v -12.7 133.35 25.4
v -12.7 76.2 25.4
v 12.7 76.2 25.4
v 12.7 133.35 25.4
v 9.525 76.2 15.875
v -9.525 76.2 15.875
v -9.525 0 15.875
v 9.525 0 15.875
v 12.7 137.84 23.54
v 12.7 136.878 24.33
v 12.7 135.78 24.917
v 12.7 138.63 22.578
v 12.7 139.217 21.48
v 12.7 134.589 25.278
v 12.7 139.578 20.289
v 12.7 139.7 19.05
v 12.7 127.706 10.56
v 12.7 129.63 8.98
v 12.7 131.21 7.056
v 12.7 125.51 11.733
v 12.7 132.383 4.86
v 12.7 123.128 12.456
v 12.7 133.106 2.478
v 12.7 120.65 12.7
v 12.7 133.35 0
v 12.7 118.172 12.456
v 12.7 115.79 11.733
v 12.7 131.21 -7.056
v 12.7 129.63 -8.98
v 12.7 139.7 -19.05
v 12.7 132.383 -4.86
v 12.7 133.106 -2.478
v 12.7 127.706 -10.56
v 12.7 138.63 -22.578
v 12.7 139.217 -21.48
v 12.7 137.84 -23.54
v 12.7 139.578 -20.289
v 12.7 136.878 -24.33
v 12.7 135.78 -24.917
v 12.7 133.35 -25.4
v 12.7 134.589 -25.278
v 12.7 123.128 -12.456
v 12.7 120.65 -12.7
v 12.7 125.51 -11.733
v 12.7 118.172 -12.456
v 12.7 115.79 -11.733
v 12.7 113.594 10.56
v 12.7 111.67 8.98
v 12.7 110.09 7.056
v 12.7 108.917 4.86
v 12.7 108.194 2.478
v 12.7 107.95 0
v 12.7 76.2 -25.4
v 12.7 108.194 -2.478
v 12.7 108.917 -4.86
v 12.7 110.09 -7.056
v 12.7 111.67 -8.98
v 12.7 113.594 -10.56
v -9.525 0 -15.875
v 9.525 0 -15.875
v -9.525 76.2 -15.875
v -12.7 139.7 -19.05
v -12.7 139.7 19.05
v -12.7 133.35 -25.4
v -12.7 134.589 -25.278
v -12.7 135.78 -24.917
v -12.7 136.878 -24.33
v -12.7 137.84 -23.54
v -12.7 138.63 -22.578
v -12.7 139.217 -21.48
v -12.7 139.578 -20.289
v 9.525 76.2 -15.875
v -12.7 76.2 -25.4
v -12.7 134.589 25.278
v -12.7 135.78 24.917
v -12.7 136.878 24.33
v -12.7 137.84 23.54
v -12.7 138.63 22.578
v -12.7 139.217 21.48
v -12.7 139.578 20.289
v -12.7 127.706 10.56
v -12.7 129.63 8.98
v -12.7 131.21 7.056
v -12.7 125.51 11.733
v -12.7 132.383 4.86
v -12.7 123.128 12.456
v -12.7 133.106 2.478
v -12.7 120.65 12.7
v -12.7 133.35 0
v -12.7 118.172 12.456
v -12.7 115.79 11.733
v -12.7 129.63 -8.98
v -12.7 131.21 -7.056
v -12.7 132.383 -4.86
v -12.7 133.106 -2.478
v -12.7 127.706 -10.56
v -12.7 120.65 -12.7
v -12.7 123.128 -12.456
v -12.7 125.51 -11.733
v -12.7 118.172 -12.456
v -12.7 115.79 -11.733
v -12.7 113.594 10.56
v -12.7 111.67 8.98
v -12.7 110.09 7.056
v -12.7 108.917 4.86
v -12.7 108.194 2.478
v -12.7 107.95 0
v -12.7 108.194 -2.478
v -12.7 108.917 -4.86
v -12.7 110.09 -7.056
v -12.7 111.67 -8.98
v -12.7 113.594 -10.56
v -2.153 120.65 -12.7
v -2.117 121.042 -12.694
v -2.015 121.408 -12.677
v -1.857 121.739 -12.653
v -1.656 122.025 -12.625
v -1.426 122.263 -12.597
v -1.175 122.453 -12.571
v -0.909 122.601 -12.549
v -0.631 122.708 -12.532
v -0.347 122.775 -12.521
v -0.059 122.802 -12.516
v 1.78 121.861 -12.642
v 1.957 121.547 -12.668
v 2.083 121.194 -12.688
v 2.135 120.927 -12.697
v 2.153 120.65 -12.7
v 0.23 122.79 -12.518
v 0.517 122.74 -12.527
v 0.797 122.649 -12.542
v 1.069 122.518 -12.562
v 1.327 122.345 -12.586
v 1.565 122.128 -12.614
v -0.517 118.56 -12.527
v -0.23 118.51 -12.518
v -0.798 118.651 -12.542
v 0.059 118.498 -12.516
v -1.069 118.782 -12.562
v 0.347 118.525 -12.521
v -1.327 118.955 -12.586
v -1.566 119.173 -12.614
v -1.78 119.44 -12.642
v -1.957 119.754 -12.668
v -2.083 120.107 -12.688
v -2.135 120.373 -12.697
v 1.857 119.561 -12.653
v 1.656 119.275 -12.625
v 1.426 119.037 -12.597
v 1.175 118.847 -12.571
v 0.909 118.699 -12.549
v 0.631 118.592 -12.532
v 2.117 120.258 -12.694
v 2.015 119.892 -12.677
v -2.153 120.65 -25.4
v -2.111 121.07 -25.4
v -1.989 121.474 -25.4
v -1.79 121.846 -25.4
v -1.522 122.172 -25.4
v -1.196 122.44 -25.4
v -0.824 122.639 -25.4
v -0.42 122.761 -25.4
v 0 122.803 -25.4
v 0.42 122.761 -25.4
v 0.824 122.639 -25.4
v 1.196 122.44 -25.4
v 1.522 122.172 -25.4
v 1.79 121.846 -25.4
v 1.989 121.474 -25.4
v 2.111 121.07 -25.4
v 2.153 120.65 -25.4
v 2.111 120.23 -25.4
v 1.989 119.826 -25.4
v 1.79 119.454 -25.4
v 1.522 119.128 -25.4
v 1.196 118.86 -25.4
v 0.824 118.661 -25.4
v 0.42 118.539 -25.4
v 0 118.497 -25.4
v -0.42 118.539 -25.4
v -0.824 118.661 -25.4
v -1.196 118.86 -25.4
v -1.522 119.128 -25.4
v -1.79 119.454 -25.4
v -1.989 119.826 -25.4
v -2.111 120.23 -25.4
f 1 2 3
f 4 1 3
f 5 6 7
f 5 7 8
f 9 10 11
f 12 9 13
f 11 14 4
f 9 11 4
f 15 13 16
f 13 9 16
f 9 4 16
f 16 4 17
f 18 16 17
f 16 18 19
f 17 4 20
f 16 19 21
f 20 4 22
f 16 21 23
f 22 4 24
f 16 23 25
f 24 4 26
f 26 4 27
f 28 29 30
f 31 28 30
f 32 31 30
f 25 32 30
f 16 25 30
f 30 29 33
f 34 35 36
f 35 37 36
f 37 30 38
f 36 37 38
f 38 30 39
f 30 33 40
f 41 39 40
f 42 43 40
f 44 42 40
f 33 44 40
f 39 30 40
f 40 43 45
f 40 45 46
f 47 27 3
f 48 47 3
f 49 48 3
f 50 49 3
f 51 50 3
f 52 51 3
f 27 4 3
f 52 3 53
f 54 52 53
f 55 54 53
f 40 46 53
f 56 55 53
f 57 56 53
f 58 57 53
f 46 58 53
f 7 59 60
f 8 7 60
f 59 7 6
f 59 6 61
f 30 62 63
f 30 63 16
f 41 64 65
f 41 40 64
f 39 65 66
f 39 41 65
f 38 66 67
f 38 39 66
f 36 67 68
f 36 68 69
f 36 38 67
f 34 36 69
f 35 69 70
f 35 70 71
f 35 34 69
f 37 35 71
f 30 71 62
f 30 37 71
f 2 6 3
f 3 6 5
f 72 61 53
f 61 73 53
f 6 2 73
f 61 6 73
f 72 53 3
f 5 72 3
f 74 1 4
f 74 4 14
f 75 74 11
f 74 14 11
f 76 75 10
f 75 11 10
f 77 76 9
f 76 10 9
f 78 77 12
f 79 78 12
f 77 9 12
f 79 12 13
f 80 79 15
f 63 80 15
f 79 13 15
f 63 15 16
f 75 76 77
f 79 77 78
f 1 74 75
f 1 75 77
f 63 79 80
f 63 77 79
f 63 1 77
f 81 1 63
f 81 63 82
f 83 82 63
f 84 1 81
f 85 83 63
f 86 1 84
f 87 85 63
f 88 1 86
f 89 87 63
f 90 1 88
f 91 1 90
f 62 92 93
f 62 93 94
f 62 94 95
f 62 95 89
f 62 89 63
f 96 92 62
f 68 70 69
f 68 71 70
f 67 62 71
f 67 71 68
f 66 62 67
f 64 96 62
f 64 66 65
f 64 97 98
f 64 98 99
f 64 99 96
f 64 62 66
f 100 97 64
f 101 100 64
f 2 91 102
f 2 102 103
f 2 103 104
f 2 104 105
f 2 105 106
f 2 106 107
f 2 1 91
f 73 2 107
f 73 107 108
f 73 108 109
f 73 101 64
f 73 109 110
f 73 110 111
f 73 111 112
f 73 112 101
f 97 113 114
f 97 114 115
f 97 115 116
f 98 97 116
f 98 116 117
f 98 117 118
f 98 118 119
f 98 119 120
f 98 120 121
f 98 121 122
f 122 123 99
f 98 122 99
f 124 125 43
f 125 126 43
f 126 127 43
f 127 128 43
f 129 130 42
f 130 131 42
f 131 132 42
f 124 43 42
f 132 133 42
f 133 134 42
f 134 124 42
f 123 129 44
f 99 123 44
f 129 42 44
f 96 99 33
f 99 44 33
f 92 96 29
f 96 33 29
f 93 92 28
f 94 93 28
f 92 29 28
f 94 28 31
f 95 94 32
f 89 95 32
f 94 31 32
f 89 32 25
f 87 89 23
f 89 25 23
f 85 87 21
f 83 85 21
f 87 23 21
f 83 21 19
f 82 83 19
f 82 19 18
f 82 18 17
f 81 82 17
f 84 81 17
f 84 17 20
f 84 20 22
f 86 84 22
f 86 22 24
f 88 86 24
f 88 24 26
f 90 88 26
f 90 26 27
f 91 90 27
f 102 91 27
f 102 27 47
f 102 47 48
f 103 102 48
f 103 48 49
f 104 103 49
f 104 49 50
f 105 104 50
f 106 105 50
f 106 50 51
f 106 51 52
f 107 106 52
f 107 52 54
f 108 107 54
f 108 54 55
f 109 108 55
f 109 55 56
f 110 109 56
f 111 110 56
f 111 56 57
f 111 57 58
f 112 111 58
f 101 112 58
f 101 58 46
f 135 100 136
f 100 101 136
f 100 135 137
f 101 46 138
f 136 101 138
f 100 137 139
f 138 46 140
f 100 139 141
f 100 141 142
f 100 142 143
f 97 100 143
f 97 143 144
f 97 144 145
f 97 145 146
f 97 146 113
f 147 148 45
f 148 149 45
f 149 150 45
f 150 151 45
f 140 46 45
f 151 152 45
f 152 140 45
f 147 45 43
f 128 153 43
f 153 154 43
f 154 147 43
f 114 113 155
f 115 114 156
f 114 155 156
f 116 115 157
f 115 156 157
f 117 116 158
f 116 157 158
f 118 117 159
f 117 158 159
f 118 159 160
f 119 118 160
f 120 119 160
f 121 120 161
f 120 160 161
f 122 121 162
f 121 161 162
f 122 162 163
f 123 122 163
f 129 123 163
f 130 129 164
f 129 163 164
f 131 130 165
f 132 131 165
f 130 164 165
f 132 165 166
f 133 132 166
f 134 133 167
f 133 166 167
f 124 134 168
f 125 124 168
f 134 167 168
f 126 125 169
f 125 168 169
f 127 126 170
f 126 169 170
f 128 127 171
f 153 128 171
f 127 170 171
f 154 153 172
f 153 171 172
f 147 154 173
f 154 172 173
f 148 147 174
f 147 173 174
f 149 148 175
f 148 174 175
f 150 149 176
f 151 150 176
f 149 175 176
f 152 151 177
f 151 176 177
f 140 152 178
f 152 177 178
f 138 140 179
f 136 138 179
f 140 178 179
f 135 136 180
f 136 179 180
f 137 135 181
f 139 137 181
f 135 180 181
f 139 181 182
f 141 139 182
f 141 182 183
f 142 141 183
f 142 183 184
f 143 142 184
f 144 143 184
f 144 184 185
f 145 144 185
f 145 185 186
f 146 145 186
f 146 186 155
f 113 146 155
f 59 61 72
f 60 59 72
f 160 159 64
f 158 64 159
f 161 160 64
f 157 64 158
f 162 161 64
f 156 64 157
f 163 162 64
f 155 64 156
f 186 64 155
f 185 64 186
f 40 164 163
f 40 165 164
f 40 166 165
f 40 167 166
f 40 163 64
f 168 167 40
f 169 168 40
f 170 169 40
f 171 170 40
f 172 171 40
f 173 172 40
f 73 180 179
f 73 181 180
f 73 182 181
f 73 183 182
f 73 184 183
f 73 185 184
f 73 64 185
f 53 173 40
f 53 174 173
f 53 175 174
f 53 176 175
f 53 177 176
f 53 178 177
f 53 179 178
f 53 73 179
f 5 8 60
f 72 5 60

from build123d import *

# Parameters (mm, degrees)
SKETCH2_W               = 19.05
SKETCH2_H               = 31.75
BOSS_EXTRUDE1_DEPTH     = 76.2
SKETCH3_W               = 25.4
SKETCH3_H               = 50.8
BOSS_EXTRUDE2_DEPTH     = 63.5
FILLET1_R               = 6.35
SKETCH4_R               = 12.7
CUT_EXTRUDE1_DEPTH      = 145.244271983
CUT_EXTRUDE2_REACH      = 151.191
CUT_EXTRUDE2_END_RADIUS = 12.7
SKETCH5_R               = 2.15265


with BuildPart() as part:
    # Sketch2 → Boss-Extrude1 (new body)
    with BuildSketch(Plane(origin=(0, 0, 0), x_dir=(1, 0, 0), z_dir=(0, 1, 0))):
        Rectangle(SKETCH2_W, SKETCH2_H)
    extrude(amount=BOSS_EXTRUDE1_DEPTH)

    # Sketch3 → Boss-Extrude2 (add)
    with BuildSketch(Plane(origin=(0, 76.2, 0), x_dir=(1, 0, 0), z_dir=(0, 1, 0))):
        Rectangle(SKETCH3_W, SKETCH3_H)
    extrude(amount=BOSS_EXTRUDE2_DEPTH)

    # Fillet1
    fillet1_edges = [part.edges().sort_by_distance(p)[0] for p in [
        (0, 139.7, -25.4),
        (0, 139.7, 25.4),
    ]]
    fillet(fillet1_edges, radius=FILLET1_R)

    # Sketch4 → Cut-Extrude1 (cut, through all)
    with BuildSketch(Plane(origin=(12.7, 0, 0), x_dir=(0, 0, -1), z_dir=(1, 0, 0))):
        with Locations((0, 120.65)):
            Circle(SKETCH4_R)
    extrude(amount=-CUT_EXTRUDE1_DEPTH, mode=Mode.SUBTRACT)

    # Cut-Extrude2: up to this cylinder (the profile starts outside it)
    cut_extrude2_end = Plane(origin=(0, 120.65, 0), z_dir=(1, 0, 0)) * Cylinder(CUT_EXTRUDE2_END_RADIUS, 328.782, mode=Mode.PRIVATE)
    # Sketch5 → Cut-Extrude2 (cut, up to the surface)
    with BuildSketch(Plane(origin=(0, 0, -25.4), x_dir=(-1, 0, 0), z_dir=(0, 0, -1)), mode=Mode.PRIVATE) as cut_extrude2_sk1:
        with Locations((0, 120.65)):
            Circle(SKETCH5_R)
    cut_extrude2_tool1 = extrude(cut_extrude2_sk1.sketch, amount=-CUT_EXTRUDE2_REACH, mode=Mode.PRIVATE) - cut_extrude2_end
    add(cut_extrude2_tool1.solids().sort_by_distance((0, 120.65, -25.4))[0], mode=Mode.SUBTRACT)


solid = part.part
